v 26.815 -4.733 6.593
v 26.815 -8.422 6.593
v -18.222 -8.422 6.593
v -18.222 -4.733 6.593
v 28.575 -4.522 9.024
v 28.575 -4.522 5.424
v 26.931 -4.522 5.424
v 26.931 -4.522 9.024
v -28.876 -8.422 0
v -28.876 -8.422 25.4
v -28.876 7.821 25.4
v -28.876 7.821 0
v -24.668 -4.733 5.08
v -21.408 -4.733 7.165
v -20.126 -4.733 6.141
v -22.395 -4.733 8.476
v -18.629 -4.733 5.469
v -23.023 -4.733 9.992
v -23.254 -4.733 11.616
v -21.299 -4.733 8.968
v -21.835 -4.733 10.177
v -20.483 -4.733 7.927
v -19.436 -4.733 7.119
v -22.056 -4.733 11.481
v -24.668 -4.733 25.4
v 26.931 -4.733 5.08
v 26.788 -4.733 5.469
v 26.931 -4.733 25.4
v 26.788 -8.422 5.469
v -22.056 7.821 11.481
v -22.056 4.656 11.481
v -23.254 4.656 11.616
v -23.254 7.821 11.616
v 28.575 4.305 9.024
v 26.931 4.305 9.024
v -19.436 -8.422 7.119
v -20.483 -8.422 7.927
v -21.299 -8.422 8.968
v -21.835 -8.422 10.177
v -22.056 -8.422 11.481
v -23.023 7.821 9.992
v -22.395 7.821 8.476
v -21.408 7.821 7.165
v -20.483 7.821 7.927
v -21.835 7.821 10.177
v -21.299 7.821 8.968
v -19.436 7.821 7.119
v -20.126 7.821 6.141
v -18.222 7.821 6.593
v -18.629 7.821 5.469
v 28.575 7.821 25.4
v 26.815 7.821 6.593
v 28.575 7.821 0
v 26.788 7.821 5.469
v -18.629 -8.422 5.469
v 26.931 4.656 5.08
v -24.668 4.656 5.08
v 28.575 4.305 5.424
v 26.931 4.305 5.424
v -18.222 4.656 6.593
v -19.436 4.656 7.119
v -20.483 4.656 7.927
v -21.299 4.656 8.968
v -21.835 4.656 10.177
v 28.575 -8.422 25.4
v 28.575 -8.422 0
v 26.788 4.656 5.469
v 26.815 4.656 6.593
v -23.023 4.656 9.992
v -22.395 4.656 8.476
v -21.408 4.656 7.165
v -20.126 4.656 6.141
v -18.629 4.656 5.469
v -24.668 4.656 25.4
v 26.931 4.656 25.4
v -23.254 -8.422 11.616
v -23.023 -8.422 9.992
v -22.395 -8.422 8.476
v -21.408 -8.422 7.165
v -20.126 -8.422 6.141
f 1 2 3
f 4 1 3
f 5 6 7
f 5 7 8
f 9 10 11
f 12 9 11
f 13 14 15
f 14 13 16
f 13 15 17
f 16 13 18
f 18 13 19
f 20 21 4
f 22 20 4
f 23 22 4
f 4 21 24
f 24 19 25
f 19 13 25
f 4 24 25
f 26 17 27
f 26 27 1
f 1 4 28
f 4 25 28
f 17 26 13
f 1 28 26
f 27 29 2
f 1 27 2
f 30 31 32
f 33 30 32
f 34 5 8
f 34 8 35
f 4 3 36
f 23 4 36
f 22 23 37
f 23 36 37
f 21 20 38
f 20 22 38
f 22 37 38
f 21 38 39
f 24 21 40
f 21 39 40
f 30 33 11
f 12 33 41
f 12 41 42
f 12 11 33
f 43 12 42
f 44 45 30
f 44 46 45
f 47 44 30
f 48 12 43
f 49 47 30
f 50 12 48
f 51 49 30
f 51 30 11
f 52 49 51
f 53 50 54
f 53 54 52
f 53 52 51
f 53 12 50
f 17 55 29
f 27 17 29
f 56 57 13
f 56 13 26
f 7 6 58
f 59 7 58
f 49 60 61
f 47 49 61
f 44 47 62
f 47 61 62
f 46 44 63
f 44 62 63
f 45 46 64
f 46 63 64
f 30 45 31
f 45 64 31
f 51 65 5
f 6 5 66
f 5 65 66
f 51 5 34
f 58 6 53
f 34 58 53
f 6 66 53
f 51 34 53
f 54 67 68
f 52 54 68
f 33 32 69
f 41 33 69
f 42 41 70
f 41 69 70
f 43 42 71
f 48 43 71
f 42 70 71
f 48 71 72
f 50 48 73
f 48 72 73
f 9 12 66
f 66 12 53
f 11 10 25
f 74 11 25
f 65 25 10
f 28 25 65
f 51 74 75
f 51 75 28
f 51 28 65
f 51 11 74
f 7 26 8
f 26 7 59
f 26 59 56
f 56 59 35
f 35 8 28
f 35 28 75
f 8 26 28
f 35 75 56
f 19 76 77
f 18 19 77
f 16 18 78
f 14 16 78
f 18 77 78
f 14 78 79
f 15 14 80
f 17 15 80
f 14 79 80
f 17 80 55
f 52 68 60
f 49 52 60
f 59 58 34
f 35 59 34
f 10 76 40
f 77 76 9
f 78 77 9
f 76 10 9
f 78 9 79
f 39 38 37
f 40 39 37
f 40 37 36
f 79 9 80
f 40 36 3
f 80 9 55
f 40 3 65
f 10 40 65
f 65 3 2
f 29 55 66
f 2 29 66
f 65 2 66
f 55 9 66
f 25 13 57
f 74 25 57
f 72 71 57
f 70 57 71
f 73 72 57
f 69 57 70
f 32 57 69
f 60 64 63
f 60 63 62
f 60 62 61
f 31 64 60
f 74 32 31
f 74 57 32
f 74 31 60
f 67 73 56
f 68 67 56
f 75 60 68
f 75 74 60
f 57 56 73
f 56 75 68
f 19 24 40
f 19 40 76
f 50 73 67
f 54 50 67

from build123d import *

# Parameters (mm, degrees)
F0_W     = 57.45079
F0_H     = 16.242632
F1_DEPTH = 25.4
F2_W     = 51.598368
F2_H     = 9.389651
F3_DEPTH = 20.32
F4_W     = 8.826647
F4_H     = 3.600052
F5_DEPTH = 35.306
F7_DEPTH = 25.4


with BuildPart() as f1:
    # F0 (on Top) → F1 (new body)
    with BuildSketch(Plane.XY):
        with Locations((-0.150396, -0.30079)):
            Rectangle(F0_W, F0_H)
    extrude(amount=F1_DEPTH)

    # F2 (on face) → F3 (cut)
    with BuildSketch(Plane.XY.offset(25.4)):
        with Locations((1.131601, -0.038353)):
            Rectangle(F2_W, F2_H)
    extrude(amount=-F3_DEPTH, mode=Mode.SUBTRACT)

    # F4 (on face) → F5 (cut)
    with BuildSketch(Plane.YZ.offset(28.574999)):
        with Locations((-0.108496, 7.22357)):
            Rectangle(F4_W, F4_H)
    extrude(amount=-F5_DEPTH, mode=Mode.SUBTRACT)

    # F6 (on face) → F7 (cut)
    with BuildSketch(Plane.XZ.offset(8.422106)):
        with BuildLine():
            Line((-18.629054, 5.46905), (26.788274, 5.46905))
            Line((26.788274, 5.46905), (26.815441, 6.593401))
            Line((26.815441, 6.593401), (-18.222148, 6.593401))
            ThreePointArc((-18.222148, 6.593401), (-20.923448, 8.422133), (-22.056237, 11.48123))
            Line((-22.056237, 11.48123), (-23.254463, 11.616431))
            ThreePointArc((-23.254463, 11.616431), (-21.942804, 7.789534), (-18.629054, 5.46905))
        make_face()
    extrude(amount=-F7_DEPTH, mode=Mode.SUBTRACT)


solid = f1.part
